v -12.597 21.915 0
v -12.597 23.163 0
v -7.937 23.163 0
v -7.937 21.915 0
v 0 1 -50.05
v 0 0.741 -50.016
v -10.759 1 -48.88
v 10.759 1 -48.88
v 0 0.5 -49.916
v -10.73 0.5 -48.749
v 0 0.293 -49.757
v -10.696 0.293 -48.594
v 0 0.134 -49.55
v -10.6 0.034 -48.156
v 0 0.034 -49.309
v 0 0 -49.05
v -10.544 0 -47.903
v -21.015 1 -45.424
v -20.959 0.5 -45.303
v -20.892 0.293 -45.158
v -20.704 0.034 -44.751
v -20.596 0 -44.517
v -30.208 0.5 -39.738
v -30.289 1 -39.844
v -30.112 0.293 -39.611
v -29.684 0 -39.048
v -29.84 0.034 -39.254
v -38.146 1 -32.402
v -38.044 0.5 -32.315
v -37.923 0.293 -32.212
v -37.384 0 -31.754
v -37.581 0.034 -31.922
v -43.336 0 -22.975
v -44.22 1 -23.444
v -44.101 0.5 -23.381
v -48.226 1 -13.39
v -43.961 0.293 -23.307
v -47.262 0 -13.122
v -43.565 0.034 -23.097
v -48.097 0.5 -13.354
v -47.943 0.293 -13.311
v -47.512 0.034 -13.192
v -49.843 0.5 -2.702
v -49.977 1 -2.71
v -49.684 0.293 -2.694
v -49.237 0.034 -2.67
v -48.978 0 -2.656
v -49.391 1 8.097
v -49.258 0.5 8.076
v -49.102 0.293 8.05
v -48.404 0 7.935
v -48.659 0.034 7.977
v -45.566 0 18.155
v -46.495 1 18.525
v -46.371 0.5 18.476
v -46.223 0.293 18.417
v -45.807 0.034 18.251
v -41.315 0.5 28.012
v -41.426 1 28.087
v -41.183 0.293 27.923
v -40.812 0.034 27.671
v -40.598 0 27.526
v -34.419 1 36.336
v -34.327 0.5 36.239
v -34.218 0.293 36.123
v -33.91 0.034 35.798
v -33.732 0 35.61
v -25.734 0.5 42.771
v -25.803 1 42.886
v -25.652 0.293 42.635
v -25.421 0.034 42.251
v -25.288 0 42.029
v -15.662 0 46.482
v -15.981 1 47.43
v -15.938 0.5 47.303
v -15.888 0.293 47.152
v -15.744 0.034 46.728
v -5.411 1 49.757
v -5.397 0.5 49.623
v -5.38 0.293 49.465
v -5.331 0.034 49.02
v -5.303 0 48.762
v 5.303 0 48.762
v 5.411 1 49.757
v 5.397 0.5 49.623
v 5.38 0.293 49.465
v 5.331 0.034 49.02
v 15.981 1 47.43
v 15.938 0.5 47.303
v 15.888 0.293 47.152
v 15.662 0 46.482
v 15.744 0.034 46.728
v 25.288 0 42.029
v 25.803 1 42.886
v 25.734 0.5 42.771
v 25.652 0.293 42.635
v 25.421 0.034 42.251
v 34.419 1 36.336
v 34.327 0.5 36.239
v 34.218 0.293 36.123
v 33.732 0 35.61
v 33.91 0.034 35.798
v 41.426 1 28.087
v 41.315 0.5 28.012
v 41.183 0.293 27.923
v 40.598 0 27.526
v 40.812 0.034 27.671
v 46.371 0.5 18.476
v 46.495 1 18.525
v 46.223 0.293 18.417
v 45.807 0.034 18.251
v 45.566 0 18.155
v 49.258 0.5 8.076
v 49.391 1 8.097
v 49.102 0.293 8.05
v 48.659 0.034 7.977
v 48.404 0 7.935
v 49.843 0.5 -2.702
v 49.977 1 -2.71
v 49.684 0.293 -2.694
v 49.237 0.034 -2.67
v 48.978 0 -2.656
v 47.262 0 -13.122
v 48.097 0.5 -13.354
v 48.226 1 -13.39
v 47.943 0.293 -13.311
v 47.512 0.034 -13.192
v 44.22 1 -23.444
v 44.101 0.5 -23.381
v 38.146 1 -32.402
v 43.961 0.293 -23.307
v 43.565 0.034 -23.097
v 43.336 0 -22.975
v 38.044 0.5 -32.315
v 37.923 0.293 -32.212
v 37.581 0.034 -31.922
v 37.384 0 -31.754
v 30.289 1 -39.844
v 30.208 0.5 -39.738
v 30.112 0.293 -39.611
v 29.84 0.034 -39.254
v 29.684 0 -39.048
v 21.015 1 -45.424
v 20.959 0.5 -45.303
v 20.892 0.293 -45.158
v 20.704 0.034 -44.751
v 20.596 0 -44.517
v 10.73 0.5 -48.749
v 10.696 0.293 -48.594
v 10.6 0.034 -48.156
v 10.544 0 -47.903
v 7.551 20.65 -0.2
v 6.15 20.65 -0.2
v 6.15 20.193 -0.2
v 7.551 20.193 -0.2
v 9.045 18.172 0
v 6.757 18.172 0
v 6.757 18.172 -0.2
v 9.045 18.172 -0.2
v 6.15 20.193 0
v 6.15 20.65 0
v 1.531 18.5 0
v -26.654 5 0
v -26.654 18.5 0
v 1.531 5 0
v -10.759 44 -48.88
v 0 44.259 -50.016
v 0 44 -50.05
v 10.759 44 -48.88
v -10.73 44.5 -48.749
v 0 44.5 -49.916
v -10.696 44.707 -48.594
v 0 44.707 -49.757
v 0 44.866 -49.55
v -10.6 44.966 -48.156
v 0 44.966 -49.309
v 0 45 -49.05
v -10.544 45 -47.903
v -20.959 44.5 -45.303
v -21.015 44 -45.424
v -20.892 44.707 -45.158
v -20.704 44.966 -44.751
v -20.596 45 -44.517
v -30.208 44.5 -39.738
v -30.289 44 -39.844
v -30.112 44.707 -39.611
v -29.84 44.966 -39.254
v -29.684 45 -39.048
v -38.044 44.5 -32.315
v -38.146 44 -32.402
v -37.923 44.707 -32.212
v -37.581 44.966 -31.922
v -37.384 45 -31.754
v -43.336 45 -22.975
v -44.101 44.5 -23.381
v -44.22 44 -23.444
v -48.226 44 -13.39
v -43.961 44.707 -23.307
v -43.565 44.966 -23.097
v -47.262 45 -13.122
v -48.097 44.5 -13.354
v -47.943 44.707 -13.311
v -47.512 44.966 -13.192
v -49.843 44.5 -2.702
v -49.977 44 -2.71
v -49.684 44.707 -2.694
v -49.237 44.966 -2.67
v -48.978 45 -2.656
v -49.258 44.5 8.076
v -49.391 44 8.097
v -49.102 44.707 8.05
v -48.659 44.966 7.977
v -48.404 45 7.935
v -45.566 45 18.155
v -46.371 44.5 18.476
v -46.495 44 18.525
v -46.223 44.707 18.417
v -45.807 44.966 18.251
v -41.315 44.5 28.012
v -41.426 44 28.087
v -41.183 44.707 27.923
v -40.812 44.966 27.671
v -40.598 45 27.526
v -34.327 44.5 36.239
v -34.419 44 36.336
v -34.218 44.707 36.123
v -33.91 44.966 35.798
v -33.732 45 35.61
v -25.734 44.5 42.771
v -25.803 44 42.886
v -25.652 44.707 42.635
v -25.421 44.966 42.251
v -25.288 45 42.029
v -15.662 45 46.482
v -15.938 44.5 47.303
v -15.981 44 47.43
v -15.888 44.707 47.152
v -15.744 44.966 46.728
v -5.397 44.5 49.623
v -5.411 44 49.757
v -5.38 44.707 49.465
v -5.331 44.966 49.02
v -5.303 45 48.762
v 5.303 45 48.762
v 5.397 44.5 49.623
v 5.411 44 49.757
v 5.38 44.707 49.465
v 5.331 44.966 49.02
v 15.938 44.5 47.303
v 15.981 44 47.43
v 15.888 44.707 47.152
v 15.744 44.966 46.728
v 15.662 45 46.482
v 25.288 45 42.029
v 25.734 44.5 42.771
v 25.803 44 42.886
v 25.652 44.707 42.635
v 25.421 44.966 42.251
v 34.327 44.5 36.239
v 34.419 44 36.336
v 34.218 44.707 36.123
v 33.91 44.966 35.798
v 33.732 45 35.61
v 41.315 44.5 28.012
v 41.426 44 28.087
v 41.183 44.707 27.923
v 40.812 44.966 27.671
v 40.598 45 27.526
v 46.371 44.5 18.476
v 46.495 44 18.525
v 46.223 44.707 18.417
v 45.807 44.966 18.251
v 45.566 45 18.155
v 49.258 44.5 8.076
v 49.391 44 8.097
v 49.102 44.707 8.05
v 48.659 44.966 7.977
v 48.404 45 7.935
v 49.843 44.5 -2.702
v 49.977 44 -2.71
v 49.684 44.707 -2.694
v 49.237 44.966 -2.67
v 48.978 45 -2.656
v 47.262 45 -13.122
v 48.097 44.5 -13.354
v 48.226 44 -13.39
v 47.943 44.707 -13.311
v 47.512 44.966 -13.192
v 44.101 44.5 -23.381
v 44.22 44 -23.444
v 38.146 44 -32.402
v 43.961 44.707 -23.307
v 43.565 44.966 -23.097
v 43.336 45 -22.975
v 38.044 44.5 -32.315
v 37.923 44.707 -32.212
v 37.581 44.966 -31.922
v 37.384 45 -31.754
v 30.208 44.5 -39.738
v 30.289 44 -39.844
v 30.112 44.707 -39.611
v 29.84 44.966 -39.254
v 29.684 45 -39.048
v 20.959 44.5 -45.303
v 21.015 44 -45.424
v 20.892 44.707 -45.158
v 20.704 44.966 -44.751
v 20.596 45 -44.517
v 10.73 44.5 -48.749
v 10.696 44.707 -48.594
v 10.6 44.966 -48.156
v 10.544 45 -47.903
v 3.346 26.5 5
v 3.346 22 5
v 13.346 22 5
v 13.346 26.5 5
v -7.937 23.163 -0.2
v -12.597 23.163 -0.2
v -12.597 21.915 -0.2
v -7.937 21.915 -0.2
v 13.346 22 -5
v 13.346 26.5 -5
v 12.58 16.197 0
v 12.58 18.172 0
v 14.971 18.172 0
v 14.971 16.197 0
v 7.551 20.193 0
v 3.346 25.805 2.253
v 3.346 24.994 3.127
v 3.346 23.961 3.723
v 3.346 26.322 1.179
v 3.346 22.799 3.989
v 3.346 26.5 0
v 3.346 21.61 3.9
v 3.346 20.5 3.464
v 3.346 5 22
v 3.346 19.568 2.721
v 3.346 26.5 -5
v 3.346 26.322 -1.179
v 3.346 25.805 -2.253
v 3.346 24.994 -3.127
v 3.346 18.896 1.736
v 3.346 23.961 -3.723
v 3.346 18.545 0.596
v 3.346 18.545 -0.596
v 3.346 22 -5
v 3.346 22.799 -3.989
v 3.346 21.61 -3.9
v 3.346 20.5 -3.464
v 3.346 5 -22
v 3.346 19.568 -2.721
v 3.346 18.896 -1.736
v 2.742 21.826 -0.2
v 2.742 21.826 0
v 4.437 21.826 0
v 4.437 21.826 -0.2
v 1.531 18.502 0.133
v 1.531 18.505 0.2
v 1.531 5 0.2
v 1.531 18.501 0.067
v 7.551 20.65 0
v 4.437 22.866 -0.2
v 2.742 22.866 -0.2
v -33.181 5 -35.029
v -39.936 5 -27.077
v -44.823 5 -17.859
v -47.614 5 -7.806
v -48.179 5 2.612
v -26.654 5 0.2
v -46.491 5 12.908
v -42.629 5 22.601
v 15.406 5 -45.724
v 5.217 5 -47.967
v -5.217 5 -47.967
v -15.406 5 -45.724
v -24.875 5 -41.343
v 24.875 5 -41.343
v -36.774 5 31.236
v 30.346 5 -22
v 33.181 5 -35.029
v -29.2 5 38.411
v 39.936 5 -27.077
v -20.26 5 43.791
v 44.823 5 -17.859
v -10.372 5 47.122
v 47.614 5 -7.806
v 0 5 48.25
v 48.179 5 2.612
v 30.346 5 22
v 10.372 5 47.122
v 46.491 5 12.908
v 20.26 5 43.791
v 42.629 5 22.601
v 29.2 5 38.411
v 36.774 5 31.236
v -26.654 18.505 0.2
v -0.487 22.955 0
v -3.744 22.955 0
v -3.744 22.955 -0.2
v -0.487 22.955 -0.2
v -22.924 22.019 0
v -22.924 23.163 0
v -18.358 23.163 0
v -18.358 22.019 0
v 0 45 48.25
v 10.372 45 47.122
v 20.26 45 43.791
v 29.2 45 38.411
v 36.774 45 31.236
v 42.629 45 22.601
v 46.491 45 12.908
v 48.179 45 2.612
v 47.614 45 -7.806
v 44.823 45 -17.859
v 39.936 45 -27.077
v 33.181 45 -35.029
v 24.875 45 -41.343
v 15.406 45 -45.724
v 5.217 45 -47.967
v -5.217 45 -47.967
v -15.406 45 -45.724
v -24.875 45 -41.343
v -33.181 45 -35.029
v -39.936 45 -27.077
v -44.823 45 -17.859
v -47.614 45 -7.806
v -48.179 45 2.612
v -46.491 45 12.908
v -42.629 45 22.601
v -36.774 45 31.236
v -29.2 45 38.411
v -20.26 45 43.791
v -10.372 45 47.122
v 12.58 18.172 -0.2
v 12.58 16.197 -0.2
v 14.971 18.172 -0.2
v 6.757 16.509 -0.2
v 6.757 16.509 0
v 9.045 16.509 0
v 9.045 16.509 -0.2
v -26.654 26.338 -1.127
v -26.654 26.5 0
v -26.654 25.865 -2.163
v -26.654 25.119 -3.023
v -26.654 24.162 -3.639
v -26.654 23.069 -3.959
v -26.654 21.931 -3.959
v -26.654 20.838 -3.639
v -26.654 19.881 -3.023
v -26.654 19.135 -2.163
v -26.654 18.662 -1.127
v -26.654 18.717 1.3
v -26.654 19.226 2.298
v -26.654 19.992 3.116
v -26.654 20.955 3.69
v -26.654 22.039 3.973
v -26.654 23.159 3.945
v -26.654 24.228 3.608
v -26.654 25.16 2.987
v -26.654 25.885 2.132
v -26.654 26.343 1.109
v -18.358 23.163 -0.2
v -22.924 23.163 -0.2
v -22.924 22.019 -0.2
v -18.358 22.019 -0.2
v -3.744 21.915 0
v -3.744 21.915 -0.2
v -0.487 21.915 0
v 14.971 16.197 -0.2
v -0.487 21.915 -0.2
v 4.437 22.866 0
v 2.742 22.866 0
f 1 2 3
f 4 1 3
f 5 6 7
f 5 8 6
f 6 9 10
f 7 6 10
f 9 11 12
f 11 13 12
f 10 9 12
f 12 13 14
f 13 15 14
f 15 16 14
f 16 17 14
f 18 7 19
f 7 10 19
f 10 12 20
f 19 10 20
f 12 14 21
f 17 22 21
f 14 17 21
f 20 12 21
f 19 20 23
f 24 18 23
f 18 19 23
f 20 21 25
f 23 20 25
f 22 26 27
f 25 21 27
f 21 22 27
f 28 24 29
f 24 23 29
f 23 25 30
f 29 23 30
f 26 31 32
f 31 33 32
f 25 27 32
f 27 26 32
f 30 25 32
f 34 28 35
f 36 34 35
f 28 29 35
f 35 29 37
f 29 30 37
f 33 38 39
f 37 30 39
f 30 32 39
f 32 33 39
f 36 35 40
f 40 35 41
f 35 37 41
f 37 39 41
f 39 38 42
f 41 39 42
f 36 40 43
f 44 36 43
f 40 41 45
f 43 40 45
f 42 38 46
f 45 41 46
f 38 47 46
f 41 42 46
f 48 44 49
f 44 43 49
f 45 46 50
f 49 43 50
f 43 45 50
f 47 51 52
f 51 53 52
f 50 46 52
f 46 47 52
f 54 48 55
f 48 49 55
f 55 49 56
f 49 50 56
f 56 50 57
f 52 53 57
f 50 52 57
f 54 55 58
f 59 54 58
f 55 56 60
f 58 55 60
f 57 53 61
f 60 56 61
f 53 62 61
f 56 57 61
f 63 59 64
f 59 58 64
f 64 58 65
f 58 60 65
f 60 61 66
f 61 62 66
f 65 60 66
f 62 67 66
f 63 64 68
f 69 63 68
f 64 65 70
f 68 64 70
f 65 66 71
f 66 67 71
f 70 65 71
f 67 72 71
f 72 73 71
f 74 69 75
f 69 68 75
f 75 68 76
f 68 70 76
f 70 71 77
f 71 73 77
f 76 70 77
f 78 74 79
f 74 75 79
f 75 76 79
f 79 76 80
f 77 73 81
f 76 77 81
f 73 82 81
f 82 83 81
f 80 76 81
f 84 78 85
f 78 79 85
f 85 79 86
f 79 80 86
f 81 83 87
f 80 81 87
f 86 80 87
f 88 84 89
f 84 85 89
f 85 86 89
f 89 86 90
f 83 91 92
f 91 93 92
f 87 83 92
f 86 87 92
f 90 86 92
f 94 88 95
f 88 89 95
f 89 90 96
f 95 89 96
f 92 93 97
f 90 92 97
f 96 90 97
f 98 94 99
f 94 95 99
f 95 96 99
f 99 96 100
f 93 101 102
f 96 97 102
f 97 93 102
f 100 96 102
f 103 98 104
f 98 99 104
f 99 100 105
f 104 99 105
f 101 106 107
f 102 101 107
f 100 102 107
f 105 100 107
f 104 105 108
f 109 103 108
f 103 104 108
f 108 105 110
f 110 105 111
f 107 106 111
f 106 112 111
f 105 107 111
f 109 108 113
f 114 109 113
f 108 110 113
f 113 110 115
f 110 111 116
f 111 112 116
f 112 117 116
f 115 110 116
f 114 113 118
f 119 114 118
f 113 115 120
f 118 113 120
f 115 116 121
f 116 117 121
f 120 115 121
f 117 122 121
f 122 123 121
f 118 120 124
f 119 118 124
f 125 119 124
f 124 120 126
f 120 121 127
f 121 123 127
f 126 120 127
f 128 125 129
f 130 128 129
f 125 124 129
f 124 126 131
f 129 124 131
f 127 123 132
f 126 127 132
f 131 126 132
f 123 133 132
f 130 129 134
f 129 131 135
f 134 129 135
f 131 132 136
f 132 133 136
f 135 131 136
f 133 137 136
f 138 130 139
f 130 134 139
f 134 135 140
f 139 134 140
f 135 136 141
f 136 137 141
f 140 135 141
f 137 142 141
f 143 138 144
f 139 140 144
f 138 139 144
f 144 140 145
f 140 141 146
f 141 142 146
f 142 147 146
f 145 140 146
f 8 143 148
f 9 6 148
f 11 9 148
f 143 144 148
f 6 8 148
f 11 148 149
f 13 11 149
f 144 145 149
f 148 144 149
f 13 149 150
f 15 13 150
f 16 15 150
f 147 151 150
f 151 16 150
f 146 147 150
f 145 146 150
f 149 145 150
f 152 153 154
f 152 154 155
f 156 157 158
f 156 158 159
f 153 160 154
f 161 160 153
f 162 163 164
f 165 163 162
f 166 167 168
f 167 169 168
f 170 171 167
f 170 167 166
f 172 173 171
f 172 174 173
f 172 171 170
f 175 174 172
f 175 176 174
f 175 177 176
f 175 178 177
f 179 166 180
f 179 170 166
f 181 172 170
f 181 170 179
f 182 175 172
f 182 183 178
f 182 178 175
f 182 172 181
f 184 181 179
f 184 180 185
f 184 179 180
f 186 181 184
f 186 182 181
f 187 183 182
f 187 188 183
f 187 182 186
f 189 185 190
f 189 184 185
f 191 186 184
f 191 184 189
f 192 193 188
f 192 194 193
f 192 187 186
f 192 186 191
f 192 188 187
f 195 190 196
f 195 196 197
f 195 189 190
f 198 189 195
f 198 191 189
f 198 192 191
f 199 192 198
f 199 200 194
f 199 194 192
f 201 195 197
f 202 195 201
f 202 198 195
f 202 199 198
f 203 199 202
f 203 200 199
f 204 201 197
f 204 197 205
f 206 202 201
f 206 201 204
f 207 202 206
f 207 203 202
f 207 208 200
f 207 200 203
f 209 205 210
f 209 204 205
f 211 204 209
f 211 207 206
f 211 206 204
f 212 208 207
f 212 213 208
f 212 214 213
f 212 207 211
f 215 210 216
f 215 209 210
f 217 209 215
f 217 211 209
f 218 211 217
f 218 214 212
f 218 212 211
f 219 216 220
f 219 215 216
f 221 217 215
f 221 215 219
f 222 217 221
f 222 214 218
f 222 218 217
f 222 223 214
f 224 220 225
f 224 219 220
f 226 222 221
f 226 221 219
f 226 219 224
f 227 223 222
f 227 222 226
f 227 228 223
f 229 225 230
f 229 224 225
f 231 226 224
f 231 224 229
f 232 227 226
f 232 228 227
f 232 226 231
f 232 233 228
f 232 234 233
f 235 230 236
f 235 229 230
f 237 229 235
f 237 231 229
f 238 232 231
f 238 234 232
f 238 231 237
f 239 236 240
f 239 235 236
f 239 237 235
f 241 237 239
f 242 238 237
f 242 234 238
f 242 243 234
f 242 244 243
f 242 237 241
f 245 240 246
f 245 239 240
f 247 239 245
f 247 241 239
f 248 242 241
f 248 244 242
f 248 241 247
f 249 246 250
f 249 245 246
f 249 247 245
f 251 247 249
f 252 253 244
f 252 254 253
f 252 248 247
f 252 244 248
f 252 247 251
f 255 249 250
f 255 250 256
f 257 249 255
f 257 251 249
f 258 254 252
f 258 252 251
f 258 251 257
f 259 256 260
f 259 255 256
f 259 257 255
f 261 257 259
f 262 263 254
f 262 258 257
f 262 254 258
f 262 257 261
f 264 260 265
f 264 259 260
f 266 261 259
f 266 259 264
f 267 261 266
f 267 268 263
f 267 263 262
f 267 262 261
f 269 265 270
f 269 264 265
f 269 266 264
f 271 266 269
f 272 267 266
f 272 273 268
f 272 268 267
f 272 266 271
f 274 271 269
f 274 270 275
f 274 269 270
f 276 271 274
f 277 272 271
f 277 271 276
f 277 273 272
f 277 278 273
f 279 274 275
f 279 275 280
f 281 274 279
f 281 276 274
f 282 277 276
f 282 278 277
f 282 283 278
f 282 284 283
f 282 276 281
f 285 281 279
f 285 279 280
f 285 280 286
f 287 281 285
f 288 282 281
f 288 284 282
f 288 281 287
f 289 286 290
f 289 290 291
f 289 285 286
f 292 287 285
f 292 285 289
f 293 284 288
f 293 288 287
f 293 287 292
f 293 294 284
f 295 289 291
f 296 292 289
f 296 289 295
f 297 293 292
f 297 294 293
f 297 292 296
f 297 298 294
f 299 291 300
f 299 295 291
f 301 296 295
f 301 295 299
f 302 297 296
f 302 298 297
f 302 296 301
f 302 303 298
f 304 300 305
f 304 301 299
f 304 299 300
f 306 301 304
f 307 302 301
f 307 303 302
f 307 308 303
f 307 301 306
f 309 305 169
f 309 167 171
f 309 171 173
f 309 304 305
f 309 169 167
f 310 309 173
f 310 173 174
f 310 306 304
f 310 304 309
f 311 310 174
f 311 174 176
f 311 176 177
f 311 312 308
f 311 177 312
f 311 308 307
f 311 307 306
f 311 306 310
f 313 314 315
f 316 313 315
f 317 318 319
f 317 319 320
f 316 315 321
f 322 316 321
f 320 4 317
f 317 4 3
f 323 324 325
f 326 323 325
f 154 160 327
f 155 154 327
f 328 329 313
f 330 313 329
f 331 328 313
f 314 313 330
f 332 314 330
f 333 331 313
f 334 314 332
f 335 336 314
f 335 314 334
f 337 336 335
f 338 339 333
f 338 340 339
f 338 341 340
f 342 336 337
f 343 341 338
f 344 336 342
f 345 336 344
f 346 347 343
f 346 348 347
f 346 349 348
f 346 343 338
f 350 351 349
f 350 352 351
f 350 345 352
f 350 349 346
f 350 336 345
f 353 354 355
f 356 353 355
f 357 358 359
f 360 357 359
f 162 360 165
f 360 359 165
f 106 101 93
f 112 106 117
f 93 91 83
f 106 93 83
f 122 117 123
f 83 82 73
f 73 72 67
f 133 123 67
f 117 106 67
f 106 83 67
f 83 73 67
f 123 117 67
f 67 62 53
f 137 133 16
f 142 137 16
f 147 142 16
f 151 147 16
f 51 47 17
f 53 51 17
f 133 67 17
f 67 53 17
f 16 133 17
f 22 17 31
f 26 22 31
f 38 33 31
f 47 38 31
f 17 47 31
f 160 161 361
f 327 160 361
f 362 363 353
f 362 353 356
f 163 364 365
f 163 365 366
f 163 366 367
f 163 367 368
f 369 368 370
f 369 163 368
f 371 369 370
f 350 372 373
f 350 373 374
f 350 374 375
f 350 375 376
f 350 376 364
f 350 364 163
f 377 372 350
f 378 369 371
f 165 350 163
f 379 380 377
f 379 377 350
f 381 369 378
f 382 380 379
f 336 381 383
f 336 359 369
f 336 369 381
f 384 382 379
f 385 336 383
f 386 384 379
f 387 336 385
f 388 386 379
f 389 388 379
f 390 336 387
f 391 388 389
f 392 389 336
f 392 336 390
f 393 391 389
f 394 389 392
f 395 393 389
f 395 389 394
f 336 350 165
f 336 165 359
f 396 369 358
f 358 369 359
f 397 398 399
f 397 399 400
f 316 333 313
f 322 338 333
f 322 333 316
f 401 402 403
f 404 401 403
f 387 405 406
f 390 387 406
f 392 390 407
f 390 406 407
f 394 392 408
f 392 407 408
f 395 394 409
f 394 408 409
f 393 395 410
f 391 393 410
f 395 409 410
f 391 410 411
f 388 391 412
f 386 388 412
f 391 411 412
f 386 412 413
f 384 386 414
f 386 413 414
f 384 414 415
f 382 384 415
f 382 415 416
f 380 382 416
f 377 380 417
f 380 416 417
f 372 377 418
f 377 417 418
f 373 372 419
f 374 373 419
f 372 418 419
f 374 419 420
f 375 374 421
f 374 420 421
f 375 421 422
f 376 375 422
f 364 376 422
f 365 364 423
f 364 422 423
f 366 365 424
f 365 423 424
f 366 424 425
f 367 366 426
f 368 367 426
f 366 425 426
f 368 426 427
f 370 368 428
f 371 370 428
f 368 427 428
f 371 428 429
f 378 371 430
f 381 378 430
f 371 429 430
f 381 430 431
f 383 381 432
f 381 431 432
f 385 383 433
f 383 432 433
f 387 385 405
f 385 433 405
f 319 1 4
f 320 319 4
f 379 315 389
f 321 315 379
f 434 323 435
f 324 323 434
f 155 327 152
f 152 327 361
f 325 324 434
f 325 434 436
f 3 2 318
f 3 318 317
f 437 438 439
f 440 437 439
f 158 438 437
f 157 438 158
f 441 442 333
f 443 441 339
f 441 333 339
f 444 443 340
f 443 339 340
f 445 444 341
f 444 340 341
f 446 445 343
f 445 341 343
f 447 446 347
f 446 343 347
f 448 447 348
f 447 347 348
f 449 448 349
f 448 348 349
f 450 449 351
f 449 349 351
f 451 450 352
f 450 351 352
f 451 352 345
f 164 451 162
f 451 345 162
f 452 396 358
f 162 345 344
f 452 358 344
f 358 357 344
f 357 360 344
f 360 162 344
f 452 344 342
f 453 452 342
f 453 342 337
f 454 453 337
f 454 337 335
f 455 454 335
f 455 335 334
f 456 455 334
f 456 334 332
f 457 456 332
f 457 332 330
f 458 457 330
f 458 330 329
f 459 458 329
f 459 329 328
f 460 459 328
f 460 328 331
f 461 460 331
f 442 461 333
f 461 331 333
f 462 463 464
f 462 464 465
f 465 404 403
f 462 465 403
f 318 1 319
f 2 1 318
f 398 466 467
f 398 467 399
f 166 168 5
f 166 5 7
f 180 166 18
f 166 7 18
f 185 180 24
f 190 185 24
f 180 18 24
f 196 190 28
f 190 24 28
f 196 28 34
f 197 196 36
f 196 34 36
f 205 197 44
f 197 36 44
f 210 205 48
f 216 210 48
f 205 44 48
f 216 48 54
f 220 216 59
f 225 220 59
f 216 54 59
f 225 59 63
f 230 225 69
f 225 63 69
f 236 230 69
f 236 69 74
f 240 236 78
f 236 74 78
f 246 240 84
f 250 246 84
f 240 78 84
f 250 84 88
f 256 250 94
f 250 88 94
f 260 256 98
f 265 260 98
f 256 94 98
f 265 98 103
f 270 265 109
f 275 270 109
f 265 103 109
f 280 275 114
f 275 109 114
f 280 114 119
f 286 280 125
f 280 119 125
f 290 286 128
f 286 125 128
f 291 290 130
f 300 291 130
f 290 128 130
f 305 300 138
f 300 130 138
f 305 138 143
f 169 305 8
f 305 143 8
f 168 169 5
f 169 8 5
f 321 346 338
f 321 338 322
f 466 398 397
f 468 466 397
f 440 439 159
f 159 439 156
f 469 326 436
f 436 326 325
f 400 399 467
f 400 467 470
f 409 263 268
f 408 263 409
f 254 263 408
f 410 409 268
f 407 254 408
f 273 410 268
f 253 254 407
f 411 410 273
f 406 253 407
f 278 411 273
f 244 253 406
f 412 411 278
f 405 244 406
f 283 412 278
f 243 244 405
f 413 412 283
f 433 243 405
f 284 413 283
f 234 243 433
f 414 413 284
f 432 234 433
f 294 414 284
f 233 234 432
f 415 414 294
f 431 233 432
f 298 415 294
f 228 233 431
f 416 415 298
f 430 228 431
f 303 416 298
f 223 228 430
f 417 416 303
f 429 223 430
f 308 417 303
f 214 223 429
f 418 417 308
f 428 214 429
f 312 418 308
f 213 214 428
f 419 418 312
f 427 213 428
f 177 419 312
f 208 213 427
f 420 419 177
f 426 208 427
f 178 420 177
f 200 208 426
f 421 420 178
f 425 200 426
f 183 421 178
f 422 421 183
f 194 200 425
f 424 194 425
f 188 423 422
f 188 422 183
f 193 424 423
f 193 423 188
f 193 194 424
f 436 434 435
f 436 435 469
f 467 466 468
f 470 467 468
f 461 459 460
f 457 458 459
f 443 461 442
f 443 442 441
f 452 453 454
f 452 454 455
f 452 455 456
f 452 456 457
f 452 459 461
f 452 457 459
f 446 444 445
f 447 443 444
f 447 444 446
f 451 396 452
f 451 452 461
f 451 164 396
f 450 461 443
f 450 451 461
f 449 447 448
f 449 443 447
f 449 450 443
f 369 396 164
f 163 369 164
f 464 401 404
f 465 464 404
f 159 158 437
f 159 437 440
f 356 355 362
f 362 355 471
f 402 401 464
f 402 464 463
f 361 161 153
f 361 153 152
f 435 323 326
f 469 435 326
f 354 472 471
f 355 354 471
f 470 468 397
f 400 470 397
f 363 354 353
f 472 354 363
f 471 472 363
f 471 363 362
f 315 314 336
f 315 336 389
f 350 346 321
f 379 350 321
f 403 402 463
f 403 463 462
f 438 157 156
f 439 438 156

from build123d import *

# Parameters (mm, degrees)
SKETCH1_R                = 50.05
BOSS_EXTRUDE1_DEPTH      = 45
SKETCH3_R                = 48.25
CUT_EXTRUDE2_DEPTH       = 40
SKETCH4_W                = 10
SKETCH4_H                = 10
BOSS_EXTRUDE2_DEPTH      = 21.5
SKETCH5_R                = 4
BOSS_EXTRUDE3_DEPTH      = 30
BOSS_EXTRUDE4_REACH      = 83.302
BOSS_EXTRUDE4_END_RADIUS = 4
SKETCH6_W                = 28.184708005
SKETCH6_H                = 0.2
FILLET1_R                = 1
CHAMFER1_SIZE            = 17
SKETCH7_W                = 4.566458064
SKETCH7_H                = 1.143701811
SKETCH7_W_2              = 4.660128999
SKETCH7_H_2              = 1.247674702
SKETCH7_W_3              = 3.257159631
SKETCH7_H_3              = 1.039728918
SKETCH7_W_4              = 2.28740362
SKETCH7_H_4              = 1.66356627
SKETCH7_W_5              = 2.391376512
SKETCH7_H_5              = 1.975484945
SKETCH7_W_6              = 1.695413964
SKETCH7_H_6              = 1.039728919
SKETCH7_W_7              = 1.401040737
SKETCH7_H_7              = 0.457148196
CUT_EXTRUDE3_DEPTH       = 0.2


with BuildPart() as part:
    # Sketch1 → Boss-Extrude1 (new body)
    with BuildSketch(Plane(origin=(0, 0, 0), x_dir=(1, 0, 0), z_dir=(0, 1, 0))):
        with Locations(Location((0, 0, 0), (0, 0, 90))):
            Circle(SKETCH1_R)
    extrude(amount=BOSS_EXTRUDE1_DEPTH)

    # Sketch3 → Cut-Extrude2 (cut)
    with BuildSketch(Plane(origin=(0, 45, 0), x_dir=(1, 0, 0), z_dir=(0, 1, 0))):
        with Locations(Location((0, 0, 0), (0, 0, 270))):
            Circle(SKETCH3_R)
    extrude(amount=-CUT_EXTRUDE2_DEPTH, mode=Mode.SUBTRACT)

    # Sketch4 → Boss-Extrude2 (add)
    with BuildSketch(Plane(origin=(0, 5, 0), x_dir=(1, 0, 0), z_dir=(0, 1, 0))):
        with Locations((8.34608558, 0)):
            Rectangle(SKETCH4_W, SKETCH4_H)
    extrude(amount=BOSS_EXTRUDE2_DEPTH)

    # Sketch5 → Boss-Extrude3 (add)
    with BuildSketch(Plane.ZY.offset(-3.34608558)):
        with Locations(Location((0, 22.5, 0), (0, 0, 90))):
            Circle(SKETCH5_R)
    extrude(amount=BOSS_EXTRUDE3_DEPTH)

    # Boss-Extrude4: up to this cylinder (the profile starts outside it)
    boss_extrude4_end = Plane(origin=(-12.56156, 22.5, 0), z_dir=(1, 0, 0)) * Cylinder(BOSS_EXTRUDE4_END_RADIUS, 175.604, mode=Mode.PRIVATE)
    # Sketch6 → Boss-Extrude4 (add, up to the surface)
    with BuildSketch(Plane(origin=(0, 5, 0), x_dir=(1, 0, 0), z_dir=(0, 1, 0)), mode=Mode.PRIVATE) as boss_extrude4_sk1:
        with Locations((-12.561560418, -0.1)):
            Rectangle(SKETCH6_W, SKETCH6_H)
    boss_extrude4_tool1 = extrude(boss_extrude4_sk1.sketch, amount=BOSS_EXTRUDE4_REACH, mode=Mode.PRIVATE) - boss_extrude4_end
    add(boss_extrude4_tool1.solids().sort_by_distance((-12.56156, 5, 0.1))[0])

    # Fillet1
    fillet1_edges = [part.edges().sort_by_distance(p)[0] for p in [
        (0, 0, 50.05),
        (0, 45, 50.05),
    ]]
    fillet(fillet1_edges, radius=FILLET1_R)

    # Chamfer1
    chamfer1_edges = [part.edges().sort_by_distance(p)[0] for p in [
        (8.34608558, 5, 5),
        (13.34608558, 5, 0),
        (8.34608558, 5, -5),
    ]]
    chamfer(chamfer1_edges, length=CHAMFER1_SIZE)

    # Sketch7 → Cut-Extrude3 (cut)
    with BuildSketch(Plane.XY):
        with Locations((-20.640838481, 22.591171411)):
            Rectangle(SKETCH7_W, SKETCH7_H)
        with Locations((-10.266782469, 22.539184965)):
            Rectangle(SKETCH7_W_2, SKETCH7_H_2)
        with Locations((-2.115257482, 22.435212073)):
            Rectangle(SKETCH7_W_3, SKETCH7_H_3)
        with Locations((7.901126588, 17.340540373)):
            Rectangle(SKETCH7_W_4, SKETCH7_H_4)
        with Locations((13.775594976, 17.184581036)):
            Rectangle(SKETCH7_W_5, SKETCH7_H_5)
        with Locations((3.589327362, 22.345655797)):
            Rectangle(SKETCH7_W_6, SKETCH7_H_6)
        with Locations((6.850941154, 20.421535498)):
            Rectangle(SKETCH7_W_7, SKETCH7_H_7)
    extrude(amount=-CUT_EXTRUDE3_DEPTH, mode=Mode.SUBTRACT)


solid = part.part
